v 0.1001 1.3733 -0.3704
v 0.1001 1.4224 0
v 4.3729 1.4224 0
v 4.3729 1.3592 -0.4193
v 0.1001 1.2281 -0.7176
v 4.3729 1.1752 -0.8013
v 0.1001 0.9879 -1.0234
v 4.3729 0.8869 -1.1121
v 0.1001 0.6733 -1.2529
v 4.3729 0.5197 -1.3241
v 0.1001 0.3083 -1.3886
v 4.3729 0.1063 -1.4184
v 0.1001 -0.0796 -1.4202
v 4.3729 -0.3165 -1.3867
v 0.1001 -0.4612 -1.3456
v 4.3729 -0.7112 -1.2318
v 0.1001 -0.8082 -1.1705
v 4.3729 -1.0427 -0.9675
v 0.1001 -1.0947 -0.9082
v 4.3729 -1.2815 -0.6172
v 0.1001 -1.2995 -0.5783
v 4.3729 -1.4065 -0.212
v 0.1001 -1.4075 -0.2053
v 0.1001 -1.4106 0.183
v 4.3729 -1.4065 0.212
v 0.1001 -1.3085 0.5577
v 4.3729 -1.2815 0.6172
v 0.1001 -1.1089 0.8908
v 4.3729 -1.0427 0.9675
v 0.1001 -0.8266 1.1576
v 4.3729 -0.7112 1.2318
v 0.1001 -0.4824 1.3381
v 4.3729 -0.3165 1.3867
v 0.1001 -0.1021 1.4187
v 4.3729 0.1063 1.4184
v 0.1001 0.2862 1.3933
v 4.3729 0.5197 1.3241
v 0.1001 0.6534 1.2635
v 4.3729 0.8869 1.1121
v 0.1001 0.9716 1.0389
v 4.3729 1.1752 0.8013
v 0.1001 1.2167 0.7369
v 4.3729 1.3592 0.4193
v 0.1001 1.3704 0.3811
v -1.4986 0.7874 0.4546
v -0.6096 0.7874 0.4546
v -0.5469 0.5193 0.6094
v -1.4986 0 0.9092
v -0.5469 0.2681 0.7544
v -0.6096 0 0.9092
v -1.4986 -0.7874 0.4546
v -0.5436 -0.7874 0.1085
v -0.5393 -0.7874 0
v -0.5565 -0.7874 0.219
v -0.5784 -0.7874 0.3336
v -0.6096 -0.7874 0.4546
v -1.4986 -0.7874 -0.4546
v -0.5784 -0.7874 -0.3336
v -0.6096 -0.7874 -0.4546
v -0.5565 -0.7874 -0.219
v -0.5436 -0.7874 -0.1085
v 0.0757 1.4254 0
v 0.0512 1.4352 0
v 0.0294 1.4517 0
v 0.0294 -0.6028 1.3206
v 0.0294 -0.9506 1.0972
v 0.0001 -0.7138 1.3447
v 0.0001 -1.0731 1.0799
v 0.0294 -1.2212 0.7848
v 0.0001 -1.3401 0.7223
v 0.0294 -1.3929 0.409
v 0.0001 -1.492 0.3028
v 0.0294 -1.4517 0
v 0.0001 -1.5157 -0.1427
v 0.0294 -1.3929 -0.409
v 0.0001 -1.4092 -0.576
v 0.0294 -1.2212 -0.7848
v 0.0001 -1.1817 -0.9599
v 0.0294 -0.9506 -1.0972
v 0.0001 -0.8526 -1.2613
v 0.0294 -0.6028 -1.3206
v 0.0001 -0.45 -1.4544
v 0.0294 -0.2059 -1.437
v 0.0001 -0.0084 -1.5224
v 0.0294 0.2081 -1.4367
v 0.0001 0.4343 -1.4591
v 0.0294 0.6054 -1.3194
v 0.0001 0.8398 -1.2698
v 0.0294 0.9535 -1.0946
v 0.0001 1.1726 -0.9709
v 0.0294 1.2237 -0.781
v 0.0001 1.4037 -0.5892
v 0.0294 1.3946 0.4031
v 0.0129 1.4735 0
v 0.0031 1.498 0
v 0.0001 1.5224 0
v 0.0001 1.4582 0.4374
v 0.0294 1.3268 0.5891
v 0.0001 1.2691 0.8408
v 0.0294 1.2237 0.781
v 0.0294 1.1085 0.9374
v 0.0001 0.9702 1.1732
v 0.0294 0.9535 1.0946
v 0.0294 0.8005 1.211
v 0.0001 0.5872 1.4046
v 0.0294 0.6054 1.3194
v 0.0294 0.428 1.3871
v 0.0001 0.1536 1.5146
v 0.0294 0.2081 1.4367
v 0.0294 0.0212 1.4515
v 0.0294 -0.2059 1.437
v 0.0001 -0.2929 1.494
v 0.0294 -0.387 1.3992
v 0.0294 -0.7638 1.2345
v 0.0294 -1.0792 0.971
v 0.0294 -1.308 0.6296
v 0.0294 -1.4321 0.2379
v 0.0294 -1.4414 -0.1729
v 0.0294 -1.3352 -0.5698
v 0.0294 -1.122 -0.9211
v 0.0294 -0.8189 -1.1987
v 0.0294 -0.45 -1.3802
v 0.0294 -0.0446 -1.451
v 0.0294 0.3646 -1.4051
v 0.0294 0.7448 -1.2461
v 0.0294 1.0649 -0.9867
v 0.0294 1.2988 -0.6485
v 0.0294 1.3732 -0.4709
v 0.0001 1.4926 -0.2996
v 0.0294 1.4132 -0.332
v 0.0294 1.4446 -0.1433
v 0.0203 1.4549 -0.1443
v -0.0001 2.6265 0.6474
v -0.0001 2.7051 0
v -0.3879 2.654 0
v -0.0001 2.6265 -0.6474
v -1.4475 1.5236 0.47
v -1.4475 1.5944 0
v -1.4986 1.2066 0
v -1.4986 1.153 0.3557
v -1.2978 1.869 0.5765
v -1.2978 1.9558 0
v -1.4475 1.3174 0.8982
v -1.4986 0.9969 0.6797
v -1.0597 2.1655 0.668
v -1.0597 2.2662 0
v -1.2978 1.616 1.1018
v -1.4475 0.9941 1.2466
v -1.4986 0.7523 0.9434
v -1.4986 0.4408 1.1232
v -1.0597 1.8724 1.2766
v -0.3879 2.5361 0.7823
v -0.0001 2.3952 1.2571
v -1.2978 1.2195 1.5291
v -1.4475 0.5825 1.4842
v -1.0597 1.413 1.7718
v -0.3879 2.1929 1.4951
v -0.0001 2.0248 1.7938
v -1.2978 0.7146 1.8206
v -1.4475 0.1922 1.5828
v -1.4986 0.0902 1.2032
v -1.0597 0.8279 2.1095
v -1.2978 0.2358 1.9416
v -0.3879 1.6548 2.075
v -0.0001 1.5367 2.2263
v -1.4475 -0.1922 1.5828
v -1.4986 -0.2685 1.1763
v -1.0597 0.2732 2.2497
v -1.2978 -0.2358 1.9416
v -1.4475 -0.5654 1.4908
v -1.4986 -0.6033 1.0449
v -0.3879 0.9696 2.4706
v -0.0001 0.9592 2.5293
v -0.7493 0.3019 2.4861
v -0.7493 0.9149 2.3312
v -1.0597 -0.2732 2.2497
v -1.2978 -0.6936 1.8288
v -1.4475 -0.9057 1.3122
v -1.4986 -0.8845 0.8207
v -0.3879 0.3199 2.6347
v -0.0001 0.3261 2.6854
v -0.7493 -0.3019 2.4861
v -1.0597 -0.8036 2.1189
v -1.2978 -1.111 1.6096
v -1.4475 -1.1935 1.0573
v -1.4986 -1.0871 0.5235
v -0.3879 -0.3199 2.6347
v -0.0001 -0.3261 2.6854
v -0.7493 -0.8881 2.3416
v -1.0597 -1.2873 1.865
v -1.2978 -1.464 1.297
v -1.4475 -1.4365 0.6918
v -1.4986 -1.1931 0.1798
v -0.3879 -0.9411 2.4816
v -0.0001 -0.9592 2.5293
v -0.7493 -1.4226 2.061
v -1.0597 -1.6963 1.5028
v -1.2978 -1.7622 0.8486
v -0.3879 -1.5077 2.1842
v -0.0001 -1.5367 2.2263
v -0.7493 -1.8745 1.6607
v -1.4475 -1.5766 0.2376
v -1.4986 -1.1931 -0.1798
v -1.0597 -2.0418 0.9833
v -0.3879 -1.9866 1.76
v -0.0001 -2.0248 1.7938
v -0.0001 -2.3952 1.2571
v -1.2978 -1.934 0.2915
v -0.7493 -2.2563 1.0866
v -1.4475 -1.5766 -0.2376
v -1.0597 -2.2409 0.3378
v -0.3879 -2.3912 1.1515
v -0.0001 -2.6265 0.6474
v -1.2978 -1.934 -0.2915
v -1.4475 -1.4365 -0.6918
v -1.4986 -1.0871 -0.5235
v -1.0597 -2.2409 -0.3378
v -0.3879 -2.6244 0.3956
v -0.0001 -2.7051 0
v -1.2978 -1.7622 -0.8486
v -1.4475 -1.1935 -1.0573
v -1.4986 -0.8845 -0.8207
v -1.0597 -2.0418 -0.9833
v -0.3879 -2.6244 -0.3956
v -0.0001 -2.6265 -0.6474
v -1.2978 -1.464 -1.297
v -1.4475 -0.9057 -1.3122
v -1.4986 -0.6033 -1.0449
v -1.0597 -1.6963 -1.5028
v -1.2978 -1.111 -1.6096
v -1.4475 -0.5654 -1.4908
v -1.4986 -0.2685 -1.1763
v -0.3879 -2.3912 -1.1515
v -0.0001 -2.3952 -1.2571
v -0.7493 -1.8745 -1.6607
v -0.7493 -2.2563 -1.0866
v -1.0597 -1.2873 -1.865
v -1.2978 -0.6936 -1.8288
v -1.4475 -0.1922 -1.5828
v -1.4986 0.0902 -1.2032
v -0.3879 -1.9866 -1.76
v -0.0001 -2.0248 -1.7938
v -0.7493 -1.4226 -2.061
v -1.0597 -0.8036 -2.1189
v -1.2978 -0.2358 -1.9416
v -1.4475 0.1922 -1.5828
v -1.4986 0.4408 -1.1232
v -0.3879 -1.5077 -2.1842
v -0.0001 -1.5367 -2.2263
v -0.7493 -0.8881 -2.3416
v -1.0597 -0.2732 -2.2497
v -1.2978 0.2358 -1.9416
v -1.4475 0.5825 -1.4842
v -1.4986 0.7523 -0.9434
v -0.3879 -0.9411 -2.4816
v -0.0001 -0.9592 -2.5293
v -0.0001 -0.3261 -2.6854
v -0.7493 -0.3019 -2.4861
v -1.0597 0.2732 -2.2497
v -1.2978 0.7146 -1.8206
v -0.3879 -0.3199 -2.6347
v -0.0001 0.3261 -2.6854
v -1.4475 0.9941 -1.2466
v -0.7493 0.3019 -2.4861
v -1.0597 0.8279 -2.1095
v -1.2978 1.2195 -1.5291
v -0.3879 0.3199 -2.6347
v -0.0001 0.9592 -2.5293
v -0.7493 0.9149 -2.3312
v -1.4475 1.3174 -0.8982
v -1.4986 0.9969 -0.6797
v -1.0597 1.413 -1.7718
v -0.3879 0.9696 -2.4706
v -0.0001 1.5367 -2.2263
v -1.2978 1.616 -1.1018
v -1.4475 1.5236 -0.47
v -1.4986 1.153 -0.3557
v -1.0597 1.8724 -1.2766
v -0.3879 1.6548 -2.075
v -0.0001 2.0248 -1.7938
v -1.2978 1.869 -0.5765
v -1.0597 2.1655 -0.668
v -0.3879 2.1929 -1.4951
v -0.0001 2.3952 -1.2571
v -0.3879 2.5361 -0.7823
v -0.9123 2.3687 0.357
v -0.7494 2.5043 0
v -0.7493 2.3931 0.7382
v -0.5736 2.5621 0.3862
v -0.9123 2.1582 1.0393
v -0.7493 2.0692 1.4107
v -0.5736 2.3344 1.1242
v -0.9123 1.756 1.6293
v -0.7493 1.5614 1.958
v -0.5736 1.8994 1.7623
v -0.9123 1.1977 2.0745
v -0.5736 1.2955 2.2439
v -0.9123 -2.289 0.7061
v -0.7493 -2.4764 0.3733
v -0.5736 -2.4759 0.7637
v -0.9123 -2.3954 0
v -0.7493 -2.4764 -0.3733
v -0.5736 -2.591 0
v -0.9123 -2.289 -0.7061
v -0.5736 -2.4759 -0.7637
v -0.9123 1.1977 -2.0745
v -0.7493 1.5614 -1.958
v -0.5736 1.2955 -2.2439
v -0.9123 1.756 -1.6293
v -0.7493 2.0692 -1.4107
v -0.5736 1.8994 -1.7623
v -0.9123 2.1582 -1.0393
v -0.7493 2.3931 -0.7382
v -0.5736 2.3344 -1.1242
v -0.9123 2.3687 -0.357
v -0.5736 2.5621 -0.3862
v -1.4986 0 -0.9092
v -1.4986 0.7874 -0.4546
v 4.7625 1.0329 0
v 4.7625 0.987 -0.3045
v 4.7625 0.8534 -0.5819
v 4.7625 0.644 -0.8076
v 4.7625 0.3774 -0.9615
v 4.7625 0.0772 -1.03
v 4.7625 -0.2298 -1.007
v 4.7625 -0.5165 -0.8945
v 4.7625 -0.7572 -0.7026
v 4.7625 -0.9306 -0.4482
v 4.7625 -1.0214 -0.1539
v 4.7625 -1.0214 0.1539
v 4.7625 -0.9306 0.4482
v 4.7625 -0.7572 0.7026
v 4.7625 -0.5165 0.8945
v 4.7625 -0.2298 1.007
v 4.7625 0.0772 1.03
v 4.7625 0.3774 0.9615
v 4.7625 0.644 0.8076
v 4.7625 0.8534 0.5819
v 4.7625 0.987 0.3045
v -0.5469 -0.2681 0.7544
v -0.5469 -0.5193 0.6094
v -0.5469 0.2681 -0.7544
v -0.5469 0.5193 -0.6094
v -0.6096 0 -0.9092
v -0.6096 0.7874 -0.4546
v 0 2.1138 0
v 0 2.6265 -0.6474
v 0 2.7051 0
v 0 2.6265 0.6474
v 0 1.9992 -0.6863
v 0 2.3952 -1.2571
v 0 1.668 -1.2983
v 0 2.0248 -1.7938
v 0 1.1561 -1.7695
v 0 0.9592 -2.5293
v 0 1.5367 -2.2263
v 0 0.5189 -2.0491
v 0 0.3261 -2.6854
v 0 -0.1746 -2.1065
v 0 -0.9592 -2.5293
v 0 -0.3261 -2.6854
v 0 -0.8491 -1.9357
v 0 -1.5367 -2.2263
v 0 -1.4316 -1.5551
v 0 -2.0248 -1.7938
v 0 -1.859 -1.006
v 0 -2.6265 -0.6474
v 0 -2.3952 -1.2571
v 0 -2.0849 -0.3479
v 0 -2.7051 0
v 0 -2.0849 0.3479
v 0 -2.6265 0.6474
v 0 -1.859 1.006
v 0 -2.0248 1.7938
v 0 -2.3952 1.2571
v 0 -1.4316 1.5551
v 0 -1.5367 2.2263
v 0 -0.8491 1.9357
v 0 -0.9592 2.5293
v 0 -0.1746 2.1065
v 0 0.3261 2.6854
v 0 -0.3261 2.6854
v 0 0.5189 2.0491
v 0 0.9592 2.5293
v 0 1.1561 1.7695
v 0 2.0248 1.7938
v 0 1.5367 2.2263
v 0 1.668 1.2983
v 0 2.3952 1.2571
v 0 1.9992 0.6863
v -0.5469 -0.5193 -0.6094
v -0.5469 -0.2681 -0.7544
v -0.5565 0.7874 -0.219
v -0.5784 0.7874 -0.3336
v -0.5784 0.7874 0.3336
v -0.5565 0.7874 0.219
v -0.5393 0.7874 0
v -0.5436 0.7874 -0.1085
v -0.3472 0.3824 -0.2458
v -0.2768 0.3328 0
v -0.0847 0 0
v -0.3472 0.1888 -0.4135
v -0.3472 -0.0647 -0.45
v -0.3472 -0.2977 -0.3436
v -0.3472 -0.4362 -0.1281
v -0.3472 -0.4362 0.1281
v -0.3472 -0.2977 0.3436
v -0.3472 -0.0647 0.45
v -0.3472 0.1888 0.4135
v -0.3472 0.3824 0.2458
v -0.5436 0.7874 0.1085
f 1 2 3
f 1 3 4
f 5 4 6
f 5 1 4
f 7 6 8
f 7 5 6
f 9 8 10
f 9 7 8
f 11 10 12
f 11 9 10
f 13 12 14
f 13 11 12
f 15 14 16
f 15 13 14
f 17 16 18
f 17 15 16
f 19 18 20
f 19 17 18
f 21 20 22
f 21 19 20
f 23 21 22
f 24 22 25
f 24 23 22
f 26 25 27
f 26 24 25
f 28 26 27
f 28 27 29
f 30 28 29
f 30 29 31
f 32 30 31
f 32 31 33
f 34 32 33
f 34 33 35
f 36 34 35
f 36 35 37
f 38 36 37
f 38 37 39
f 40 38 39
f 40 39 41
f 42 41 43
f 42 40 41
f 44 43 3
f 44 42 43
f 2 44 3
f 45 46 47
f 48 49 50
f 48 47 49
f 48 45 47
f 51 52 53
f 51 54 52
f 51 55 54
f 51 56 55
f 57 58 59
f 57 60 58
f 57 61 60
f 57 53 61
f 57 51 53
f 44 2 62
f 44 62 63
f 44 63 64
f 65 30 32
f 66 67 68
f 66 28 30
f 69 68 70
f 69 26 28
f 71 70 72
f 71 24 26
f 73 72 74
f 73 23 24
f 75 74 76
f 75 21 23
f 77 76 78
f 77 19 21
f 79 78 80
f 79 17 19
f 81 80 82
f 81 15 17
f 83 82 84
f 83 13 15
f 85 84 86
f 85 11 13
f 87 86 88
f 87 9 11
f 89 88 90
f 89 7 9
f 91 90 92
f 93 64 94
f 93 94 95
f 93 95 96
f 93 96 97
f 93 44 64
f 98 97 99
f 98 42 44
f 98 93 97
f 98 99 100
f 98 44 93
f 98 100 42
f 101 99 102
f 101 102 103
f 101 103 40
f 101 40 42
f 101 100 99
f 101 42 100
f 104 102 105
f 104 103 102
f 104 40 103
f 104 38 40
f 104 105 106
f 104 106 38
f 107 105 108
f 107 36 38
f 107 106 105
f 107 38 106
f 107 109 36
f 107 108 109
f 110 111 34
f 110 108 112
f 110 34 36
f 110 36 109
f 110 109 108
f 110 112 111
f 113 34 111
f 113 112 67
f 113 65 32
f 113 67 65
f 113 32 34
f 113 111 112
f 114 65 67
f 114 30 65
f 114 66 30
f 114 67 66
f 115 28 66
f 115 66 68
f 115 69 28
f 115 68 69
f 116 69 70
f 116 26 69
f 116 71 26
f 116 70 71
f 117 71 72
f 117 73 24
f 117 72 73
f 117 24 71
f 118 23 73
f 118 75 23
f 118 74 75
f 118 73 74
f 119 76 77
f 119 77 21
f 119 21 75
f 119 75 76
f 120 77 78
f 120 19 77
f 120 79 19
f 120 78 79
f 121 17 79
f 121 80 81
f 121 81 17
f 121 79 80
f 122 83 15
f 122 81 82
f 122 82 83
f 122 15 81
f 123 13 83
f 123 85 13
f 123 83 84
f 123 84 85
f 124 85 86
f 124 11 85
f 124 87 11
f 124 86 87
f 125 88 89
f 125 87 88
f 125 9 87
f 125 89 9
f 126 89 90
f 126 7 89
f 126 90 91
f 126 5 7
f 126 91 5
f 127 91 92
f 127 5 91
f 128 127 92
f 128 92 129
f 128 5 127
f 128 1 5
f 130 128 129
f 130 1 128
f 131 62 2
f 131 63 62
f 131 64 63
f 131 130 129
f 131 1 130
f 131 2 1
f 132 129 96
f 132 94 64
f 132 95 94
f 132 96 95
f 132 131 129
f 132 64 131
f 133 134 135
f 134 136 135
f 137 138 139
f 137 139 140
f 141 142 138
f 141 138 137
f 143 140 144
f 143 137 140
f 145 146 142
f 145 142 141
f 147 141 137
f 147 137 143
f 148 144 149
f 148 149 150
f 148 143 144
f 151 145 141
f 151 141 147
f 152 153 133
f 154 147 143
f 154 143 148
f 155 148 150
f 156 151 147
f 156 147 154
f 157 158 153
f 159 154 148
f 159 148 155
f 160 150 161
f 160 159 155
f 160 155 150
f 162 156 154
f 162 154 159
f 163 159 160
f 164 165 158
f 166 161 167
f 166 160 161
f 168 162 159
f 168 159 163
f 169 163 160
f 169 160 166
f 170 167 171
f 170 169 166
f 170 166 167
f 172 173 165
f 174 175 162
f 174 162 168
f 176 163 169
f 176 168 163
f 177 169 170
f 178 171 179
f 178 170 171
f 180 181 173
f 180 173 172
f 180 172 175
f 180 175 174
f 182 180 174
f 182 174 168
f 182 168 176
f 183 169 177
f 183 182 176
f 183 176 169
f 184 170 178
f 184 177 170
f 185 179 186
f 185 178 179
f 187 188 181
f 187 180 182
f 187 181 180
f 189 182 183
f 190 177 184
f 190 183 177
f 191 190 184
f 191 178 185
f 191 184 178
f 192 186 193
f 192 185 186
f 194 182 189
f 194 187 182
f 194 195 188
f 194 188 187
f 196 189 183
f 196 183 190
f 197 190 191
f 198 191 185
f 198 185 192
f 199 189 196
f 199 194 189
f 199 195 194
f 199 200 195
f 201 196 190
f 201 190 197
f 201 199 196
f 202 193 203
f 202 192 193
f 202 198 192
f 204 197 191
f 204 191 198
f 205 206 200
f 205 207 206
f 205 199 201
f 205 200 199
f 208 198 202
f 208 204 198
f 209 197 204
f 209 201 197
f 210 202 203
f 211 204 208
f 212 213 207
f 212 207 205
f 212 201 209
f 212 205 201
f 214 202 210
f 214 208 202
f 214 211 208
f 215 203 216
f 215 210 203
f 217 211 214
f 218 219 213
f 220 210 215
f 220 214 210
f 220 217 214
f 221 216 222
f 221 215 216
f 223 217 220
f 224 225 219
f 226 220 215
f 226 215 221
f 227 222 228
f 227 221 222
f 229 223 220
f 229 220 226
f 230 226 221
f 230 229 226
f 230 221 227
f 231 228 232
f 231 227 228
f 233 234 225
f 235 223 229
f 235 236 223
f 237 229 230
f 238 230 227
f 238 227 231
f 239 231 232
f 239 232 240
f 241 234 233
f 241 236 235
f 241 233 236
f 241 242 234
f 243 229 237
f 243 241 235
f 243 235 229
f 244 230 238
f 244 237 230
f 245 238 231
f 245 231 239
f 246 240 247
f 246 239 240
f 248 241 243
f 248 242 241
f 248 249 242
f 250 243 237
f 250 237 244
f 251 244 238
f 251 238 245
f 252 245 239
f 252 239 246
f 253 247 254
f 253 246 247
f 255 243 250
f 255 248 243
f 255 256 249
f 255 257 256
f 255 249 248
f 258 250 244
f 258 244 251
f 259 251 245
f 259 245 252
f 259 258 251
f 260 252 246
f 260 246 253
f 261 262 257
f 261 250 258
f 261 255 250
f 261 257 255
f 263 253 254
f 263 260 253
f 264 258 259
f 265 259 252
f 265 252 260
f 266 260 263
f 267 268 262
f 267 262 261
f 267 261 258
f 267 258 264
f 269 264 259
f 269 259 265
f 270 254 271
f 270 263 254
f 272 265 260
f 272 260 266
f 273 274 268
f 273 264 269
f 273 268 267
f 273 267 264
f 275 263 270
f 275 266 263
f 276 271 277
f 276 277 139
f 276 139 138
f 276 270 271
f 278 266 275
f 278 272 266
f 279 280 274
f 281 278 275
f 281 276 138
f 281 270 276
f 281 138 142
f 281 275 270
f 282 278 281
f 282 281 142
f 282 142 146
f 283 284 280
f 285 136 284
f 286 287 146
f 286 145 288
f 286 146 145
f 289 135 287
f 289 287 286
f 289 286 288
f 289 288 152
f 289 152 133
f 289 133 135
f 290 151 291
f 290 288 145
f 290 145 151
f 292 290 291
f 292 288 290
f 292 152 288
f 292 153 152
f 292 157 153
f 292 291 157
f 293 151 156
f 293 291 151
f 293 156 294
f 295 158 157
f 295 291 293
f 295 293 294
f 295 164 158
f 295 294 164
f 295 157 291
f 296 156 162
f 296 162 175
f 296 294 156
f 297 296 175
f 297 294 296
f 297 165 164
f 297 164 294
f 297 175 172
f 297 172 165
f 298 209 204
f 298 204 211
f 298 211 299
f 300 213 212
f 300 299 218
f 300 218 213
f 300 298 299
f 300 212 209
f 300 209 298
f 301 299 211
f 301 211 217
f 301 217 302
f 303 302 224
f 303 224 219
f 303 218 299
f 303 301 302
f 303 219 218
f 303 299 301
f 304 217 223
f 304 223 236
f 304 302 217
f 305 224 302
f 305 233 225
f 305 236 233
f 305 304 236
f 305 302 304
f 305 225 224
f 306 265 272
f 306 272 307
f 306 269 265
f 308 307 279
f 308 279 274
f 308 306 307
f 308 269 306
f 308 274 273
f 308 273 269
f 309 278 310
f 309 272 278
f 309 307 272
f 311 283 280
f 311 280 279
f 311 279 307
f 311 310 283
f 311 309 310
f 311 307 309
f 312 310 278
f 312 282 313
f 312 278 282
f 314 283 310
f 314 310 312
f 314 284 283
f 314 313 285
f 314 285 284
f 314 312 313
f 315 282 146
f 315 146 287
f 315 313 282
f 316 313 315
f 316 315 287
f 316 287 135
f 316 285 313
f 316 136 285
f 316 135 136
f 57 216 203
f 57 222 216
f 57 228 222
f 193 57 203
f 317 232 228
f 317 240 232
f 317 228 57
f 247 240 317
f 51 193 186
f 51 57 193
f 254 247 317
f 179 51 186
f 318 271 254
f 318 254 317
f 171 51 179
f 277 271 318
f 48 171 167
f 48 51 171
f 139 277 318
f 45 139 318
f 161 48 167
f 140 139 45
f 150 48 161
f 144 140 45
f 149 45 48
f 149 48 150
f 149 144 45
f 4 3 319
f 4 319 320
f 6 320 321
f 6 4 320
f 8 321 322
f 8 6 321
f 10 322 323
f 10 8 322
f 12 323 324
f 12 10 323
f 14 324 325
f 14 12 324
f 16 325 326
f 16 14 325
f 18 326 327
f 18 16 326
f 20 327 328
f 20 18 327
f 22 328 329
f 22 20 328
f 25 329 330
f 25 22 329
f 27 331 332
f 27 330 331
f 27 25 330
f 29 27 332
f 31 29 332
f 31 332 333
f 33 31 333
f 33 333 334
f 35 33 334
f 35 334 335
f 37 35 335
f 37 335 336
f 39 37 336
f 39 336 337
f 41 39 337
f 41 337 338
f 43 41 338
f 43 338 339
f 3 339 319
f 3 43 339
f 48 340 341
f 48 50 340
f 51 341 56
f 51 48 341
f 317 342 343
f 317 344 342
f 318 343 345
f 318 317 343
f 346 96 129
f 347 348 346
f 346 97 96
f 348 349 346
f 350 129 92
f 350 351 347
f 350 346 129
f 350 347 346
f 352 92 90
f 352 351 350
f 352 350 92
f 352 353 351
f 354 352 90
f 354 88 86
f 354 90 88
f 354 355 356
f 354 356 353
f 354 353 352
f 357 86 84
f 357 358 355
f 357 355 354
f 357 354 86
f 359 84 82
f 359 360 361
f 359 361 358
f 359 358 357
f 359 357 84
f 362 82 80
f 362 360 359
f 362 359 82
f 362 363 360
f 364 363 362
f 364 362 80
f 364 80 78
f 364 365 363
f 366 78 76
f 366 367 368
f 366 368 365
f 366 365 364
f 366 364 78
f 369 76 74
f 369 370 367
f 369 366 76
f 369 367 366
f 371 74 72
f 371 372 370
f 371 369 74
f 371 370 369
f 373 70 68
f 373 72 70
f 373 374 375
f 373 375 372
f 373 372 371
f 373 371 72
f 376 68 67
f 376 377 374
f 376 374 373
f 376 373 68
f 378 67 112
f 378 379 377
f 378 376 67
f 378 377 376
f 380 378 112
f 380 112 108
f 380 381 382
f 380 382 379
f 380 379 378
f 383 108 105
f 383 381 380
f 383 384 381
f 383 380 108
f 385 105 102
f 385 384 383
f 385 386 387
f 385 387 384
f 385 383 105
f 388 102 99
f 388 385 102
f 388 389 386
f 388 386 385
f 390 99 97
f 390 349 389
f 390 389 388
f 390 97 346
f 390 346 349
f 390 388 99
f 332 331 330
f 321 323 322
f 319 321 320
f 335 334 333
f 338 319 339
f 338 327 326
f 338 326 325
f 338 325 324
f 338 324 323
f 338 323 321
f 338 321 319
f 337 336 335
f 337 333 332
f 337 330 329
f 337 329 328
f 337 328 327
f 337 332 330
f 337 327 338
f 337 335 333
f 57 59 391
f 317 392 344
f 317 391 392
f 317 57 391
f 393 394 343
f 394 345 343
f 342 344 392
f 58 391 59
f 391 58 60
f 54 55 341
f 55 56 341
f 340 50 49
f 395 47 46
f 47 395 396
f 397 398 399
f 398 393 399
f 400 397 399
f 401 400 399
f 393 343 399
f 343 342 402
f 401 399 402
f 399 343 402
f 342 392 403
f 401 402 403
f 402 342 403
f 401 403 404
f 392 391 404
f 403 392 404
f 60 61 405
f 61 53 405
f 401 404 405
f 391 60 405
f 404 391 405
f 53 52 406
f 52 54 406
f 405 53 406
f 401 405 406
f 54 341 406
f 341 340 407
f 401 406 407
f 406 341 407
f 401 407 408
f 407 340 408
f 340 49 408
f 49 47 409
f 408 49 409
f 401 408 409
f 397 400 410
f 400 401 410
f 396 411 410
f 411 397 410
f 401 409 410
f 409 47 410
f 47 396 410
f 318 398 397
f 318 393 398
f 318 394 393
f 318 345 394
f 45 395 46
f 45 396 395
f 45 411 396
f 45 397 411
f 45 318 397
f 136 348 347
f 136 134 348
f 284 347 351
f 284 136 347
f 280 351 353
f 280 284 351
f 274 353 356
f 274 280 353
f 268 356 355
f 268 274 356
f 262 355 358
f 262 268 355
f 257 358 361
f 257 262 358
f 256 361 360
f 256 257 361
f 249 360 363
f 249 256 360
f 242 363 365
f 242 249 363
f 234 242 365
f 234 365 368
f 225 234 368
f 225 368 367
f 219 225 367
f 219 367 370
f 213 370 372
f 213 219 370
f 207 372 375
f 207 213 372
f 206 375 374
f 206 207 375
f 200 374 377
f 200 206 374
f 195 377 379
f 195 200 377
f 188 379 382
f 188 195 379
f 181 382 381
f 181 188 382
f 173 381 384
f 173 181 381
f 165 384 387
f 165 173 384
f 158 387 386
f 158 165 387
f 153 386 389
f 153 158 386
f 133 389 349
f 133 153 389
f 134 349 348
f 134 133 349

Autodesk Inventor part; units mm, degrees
ref_plane "YZ Plane" through (0, 0, 0) normal (1, 0, 0) x (0, 1, 0)
ref_plane "XZ Plane" through (0, 0, 0) normal (0, 1, 0) x (-1, 0, 0)
sketch "Sketch1" plane through (0, 0, 0) normal (0, 0, 1) x (1, 0, 0)
  line L0 (-0.0847, 0) -> (4.7625, 0)
  line L1 (4.7625, 0) -> (4.7625, 1.4224)
  line L2 (4.7625, 1.4224) -> (1.2702, 1.4224)
  line L3 (1.2702, 1.4224) -> (0.0001, 1.4224)
  line L4 (0.0001, 1.4224) -> (0, 1.4224)
  line L5 (0, 1.4224) -> (0, 2.7051)
  line L6 (0, 2.7051) -> (-1.4986, 2.7051)
  line L7 (-1.4986, 2.7051) -> (-1.4986, 0.9092)
  line L8 (-1.4986, 0.9092) -> (-0.6096, 0.9092)
  line L9 (-0.6096, 0.9092) -> (-0.0847, 0)
  line L10 (-2.7508, 0) -> (6.0147, 0) projected
  line L11 (0, -0.541) -> (0, 3.2461) projected
  line L12 (1.2702, 1.4224) -> (0, 1.4224) construction
  dimension "d1" = 3.4923
  dimension "d2" = 1.2701
  dimension "d3" = 1.4986
  dimension "d4" = 0.889
  dimension "d5" = 60
  dimension "d6" = 2.8448
  dimension "d7" = 2.8448
  dimension "d8" = 1.8184
  dimension "d9" = 5.4102
  dimension "d26" = 4.7625
revolve "Body" add sketch "Sketch1" angle 360 about axis through (-0.0847, 0, 0) along (1, 0, 0)
sketch "Sketch2" plane through (-1.4986, 0, 0) normal (-1, 0, 0) x (0, 0, 1)
  circle A0 centre (0, 0) radius 0.9092 projected
  line L0 (0, -3.7871) -> (0, 3.7871) projected
  line L1 (-3.7871, 0) -> (3.7871, 0) projected
  line L2 (0.9092, 0) -> (0.4546, -0.7874)
  line L3 (0.4546, -0.7874) -> (-0.4546, -0.7874)
  line L4 (-0.4546, -0.7874) -> (-0.9092, 0)
  line L5 (-0.9092, 0) -> (-0.4546, 0.7874)
  line L6 (-0.4546, 0.7874) -> (0.4546, 0.7874)
  line L7 (0.4546, 0.7874) -> (0.9092, 0)
extrude "Slot" add sketch "Sketch2" against normal up to next contours L7 A0 | A0 L2 | L6 L0 A0 | A0 L0 L3 | L0 L6 A0 | A0 L3 L0 | L4 A0 | A0 L5
fillet "Fillet1" radius 1.4985 1 edges at (-1.4986, -2.7051, 0)
thread "Thread" size "4-40 UNC" class "2A" standard "ANSI Unified Screw Threads" length 3.4923
chamfer "Chamfer1" distance 0.3895 distance2 0.3896 1 edges at (4.7625, -1.4224, 0) measured on face at (4.7625, -0.0627, 0.6443)
ref_plane "Work Plane1" through (29, 0, 0) normal (0, -1, 0) x (1, 0, 0)
fillet "Fillet2" radius 0.1 1 edges at (0.0001, -1.4224, 0)
equation "\"d1\" = GEL"
equation "\"d3\" = KOH"
equation "\"d4\" = INTI"
equation "\"d6\" = GD"
equation "\"d7\" = BDM"
equation "\"d8\" = 1.1547 * SW"
equation "\"d9\" = KOD"
equation "\"d26\" = NLG"
equation "\"d30\" = R"
equation "\"d17\" = RR"
equation "\"d13\" = GEL"
equation "\"d15\" = -0.5 * SPD + 0.5 * GD"
equation "\"d16\" = GUL"
equation "\"GD\" = NND"
equation "\"NLG\" = 4.7625"
equation "\"GEL\" = 3.4923"
equation "\"KOD\" = 5.4102"
equation "\"KOH\" = 1.4986"
equation "\"INTI\" = 0.889"
equation "\"GAL\" = 1.27"
equation "\"GUL\" = 0.38964"
equation "\"BDM\" = NND"
equation "\"SW\" = 1.5748"
equation "\"RR\" = 1.4985"
equation "\"SPD\" = 2.06578"
equation "\"R\" = 0.1"
equation "\"TOA\" = 30deg"
equation "\"GD1\" = SPD"
equation "\"THREADDIA\" = 2.8448"
equation "\"KOH1\" = 0.381"
equation "\"NND\" = 2.8448"
equation "\"E0\" = 1.81889"
properties part number "ANSI B18.3 - 4 - 40 x 3/16, HSBHCSI" material "Steel, Mild"
